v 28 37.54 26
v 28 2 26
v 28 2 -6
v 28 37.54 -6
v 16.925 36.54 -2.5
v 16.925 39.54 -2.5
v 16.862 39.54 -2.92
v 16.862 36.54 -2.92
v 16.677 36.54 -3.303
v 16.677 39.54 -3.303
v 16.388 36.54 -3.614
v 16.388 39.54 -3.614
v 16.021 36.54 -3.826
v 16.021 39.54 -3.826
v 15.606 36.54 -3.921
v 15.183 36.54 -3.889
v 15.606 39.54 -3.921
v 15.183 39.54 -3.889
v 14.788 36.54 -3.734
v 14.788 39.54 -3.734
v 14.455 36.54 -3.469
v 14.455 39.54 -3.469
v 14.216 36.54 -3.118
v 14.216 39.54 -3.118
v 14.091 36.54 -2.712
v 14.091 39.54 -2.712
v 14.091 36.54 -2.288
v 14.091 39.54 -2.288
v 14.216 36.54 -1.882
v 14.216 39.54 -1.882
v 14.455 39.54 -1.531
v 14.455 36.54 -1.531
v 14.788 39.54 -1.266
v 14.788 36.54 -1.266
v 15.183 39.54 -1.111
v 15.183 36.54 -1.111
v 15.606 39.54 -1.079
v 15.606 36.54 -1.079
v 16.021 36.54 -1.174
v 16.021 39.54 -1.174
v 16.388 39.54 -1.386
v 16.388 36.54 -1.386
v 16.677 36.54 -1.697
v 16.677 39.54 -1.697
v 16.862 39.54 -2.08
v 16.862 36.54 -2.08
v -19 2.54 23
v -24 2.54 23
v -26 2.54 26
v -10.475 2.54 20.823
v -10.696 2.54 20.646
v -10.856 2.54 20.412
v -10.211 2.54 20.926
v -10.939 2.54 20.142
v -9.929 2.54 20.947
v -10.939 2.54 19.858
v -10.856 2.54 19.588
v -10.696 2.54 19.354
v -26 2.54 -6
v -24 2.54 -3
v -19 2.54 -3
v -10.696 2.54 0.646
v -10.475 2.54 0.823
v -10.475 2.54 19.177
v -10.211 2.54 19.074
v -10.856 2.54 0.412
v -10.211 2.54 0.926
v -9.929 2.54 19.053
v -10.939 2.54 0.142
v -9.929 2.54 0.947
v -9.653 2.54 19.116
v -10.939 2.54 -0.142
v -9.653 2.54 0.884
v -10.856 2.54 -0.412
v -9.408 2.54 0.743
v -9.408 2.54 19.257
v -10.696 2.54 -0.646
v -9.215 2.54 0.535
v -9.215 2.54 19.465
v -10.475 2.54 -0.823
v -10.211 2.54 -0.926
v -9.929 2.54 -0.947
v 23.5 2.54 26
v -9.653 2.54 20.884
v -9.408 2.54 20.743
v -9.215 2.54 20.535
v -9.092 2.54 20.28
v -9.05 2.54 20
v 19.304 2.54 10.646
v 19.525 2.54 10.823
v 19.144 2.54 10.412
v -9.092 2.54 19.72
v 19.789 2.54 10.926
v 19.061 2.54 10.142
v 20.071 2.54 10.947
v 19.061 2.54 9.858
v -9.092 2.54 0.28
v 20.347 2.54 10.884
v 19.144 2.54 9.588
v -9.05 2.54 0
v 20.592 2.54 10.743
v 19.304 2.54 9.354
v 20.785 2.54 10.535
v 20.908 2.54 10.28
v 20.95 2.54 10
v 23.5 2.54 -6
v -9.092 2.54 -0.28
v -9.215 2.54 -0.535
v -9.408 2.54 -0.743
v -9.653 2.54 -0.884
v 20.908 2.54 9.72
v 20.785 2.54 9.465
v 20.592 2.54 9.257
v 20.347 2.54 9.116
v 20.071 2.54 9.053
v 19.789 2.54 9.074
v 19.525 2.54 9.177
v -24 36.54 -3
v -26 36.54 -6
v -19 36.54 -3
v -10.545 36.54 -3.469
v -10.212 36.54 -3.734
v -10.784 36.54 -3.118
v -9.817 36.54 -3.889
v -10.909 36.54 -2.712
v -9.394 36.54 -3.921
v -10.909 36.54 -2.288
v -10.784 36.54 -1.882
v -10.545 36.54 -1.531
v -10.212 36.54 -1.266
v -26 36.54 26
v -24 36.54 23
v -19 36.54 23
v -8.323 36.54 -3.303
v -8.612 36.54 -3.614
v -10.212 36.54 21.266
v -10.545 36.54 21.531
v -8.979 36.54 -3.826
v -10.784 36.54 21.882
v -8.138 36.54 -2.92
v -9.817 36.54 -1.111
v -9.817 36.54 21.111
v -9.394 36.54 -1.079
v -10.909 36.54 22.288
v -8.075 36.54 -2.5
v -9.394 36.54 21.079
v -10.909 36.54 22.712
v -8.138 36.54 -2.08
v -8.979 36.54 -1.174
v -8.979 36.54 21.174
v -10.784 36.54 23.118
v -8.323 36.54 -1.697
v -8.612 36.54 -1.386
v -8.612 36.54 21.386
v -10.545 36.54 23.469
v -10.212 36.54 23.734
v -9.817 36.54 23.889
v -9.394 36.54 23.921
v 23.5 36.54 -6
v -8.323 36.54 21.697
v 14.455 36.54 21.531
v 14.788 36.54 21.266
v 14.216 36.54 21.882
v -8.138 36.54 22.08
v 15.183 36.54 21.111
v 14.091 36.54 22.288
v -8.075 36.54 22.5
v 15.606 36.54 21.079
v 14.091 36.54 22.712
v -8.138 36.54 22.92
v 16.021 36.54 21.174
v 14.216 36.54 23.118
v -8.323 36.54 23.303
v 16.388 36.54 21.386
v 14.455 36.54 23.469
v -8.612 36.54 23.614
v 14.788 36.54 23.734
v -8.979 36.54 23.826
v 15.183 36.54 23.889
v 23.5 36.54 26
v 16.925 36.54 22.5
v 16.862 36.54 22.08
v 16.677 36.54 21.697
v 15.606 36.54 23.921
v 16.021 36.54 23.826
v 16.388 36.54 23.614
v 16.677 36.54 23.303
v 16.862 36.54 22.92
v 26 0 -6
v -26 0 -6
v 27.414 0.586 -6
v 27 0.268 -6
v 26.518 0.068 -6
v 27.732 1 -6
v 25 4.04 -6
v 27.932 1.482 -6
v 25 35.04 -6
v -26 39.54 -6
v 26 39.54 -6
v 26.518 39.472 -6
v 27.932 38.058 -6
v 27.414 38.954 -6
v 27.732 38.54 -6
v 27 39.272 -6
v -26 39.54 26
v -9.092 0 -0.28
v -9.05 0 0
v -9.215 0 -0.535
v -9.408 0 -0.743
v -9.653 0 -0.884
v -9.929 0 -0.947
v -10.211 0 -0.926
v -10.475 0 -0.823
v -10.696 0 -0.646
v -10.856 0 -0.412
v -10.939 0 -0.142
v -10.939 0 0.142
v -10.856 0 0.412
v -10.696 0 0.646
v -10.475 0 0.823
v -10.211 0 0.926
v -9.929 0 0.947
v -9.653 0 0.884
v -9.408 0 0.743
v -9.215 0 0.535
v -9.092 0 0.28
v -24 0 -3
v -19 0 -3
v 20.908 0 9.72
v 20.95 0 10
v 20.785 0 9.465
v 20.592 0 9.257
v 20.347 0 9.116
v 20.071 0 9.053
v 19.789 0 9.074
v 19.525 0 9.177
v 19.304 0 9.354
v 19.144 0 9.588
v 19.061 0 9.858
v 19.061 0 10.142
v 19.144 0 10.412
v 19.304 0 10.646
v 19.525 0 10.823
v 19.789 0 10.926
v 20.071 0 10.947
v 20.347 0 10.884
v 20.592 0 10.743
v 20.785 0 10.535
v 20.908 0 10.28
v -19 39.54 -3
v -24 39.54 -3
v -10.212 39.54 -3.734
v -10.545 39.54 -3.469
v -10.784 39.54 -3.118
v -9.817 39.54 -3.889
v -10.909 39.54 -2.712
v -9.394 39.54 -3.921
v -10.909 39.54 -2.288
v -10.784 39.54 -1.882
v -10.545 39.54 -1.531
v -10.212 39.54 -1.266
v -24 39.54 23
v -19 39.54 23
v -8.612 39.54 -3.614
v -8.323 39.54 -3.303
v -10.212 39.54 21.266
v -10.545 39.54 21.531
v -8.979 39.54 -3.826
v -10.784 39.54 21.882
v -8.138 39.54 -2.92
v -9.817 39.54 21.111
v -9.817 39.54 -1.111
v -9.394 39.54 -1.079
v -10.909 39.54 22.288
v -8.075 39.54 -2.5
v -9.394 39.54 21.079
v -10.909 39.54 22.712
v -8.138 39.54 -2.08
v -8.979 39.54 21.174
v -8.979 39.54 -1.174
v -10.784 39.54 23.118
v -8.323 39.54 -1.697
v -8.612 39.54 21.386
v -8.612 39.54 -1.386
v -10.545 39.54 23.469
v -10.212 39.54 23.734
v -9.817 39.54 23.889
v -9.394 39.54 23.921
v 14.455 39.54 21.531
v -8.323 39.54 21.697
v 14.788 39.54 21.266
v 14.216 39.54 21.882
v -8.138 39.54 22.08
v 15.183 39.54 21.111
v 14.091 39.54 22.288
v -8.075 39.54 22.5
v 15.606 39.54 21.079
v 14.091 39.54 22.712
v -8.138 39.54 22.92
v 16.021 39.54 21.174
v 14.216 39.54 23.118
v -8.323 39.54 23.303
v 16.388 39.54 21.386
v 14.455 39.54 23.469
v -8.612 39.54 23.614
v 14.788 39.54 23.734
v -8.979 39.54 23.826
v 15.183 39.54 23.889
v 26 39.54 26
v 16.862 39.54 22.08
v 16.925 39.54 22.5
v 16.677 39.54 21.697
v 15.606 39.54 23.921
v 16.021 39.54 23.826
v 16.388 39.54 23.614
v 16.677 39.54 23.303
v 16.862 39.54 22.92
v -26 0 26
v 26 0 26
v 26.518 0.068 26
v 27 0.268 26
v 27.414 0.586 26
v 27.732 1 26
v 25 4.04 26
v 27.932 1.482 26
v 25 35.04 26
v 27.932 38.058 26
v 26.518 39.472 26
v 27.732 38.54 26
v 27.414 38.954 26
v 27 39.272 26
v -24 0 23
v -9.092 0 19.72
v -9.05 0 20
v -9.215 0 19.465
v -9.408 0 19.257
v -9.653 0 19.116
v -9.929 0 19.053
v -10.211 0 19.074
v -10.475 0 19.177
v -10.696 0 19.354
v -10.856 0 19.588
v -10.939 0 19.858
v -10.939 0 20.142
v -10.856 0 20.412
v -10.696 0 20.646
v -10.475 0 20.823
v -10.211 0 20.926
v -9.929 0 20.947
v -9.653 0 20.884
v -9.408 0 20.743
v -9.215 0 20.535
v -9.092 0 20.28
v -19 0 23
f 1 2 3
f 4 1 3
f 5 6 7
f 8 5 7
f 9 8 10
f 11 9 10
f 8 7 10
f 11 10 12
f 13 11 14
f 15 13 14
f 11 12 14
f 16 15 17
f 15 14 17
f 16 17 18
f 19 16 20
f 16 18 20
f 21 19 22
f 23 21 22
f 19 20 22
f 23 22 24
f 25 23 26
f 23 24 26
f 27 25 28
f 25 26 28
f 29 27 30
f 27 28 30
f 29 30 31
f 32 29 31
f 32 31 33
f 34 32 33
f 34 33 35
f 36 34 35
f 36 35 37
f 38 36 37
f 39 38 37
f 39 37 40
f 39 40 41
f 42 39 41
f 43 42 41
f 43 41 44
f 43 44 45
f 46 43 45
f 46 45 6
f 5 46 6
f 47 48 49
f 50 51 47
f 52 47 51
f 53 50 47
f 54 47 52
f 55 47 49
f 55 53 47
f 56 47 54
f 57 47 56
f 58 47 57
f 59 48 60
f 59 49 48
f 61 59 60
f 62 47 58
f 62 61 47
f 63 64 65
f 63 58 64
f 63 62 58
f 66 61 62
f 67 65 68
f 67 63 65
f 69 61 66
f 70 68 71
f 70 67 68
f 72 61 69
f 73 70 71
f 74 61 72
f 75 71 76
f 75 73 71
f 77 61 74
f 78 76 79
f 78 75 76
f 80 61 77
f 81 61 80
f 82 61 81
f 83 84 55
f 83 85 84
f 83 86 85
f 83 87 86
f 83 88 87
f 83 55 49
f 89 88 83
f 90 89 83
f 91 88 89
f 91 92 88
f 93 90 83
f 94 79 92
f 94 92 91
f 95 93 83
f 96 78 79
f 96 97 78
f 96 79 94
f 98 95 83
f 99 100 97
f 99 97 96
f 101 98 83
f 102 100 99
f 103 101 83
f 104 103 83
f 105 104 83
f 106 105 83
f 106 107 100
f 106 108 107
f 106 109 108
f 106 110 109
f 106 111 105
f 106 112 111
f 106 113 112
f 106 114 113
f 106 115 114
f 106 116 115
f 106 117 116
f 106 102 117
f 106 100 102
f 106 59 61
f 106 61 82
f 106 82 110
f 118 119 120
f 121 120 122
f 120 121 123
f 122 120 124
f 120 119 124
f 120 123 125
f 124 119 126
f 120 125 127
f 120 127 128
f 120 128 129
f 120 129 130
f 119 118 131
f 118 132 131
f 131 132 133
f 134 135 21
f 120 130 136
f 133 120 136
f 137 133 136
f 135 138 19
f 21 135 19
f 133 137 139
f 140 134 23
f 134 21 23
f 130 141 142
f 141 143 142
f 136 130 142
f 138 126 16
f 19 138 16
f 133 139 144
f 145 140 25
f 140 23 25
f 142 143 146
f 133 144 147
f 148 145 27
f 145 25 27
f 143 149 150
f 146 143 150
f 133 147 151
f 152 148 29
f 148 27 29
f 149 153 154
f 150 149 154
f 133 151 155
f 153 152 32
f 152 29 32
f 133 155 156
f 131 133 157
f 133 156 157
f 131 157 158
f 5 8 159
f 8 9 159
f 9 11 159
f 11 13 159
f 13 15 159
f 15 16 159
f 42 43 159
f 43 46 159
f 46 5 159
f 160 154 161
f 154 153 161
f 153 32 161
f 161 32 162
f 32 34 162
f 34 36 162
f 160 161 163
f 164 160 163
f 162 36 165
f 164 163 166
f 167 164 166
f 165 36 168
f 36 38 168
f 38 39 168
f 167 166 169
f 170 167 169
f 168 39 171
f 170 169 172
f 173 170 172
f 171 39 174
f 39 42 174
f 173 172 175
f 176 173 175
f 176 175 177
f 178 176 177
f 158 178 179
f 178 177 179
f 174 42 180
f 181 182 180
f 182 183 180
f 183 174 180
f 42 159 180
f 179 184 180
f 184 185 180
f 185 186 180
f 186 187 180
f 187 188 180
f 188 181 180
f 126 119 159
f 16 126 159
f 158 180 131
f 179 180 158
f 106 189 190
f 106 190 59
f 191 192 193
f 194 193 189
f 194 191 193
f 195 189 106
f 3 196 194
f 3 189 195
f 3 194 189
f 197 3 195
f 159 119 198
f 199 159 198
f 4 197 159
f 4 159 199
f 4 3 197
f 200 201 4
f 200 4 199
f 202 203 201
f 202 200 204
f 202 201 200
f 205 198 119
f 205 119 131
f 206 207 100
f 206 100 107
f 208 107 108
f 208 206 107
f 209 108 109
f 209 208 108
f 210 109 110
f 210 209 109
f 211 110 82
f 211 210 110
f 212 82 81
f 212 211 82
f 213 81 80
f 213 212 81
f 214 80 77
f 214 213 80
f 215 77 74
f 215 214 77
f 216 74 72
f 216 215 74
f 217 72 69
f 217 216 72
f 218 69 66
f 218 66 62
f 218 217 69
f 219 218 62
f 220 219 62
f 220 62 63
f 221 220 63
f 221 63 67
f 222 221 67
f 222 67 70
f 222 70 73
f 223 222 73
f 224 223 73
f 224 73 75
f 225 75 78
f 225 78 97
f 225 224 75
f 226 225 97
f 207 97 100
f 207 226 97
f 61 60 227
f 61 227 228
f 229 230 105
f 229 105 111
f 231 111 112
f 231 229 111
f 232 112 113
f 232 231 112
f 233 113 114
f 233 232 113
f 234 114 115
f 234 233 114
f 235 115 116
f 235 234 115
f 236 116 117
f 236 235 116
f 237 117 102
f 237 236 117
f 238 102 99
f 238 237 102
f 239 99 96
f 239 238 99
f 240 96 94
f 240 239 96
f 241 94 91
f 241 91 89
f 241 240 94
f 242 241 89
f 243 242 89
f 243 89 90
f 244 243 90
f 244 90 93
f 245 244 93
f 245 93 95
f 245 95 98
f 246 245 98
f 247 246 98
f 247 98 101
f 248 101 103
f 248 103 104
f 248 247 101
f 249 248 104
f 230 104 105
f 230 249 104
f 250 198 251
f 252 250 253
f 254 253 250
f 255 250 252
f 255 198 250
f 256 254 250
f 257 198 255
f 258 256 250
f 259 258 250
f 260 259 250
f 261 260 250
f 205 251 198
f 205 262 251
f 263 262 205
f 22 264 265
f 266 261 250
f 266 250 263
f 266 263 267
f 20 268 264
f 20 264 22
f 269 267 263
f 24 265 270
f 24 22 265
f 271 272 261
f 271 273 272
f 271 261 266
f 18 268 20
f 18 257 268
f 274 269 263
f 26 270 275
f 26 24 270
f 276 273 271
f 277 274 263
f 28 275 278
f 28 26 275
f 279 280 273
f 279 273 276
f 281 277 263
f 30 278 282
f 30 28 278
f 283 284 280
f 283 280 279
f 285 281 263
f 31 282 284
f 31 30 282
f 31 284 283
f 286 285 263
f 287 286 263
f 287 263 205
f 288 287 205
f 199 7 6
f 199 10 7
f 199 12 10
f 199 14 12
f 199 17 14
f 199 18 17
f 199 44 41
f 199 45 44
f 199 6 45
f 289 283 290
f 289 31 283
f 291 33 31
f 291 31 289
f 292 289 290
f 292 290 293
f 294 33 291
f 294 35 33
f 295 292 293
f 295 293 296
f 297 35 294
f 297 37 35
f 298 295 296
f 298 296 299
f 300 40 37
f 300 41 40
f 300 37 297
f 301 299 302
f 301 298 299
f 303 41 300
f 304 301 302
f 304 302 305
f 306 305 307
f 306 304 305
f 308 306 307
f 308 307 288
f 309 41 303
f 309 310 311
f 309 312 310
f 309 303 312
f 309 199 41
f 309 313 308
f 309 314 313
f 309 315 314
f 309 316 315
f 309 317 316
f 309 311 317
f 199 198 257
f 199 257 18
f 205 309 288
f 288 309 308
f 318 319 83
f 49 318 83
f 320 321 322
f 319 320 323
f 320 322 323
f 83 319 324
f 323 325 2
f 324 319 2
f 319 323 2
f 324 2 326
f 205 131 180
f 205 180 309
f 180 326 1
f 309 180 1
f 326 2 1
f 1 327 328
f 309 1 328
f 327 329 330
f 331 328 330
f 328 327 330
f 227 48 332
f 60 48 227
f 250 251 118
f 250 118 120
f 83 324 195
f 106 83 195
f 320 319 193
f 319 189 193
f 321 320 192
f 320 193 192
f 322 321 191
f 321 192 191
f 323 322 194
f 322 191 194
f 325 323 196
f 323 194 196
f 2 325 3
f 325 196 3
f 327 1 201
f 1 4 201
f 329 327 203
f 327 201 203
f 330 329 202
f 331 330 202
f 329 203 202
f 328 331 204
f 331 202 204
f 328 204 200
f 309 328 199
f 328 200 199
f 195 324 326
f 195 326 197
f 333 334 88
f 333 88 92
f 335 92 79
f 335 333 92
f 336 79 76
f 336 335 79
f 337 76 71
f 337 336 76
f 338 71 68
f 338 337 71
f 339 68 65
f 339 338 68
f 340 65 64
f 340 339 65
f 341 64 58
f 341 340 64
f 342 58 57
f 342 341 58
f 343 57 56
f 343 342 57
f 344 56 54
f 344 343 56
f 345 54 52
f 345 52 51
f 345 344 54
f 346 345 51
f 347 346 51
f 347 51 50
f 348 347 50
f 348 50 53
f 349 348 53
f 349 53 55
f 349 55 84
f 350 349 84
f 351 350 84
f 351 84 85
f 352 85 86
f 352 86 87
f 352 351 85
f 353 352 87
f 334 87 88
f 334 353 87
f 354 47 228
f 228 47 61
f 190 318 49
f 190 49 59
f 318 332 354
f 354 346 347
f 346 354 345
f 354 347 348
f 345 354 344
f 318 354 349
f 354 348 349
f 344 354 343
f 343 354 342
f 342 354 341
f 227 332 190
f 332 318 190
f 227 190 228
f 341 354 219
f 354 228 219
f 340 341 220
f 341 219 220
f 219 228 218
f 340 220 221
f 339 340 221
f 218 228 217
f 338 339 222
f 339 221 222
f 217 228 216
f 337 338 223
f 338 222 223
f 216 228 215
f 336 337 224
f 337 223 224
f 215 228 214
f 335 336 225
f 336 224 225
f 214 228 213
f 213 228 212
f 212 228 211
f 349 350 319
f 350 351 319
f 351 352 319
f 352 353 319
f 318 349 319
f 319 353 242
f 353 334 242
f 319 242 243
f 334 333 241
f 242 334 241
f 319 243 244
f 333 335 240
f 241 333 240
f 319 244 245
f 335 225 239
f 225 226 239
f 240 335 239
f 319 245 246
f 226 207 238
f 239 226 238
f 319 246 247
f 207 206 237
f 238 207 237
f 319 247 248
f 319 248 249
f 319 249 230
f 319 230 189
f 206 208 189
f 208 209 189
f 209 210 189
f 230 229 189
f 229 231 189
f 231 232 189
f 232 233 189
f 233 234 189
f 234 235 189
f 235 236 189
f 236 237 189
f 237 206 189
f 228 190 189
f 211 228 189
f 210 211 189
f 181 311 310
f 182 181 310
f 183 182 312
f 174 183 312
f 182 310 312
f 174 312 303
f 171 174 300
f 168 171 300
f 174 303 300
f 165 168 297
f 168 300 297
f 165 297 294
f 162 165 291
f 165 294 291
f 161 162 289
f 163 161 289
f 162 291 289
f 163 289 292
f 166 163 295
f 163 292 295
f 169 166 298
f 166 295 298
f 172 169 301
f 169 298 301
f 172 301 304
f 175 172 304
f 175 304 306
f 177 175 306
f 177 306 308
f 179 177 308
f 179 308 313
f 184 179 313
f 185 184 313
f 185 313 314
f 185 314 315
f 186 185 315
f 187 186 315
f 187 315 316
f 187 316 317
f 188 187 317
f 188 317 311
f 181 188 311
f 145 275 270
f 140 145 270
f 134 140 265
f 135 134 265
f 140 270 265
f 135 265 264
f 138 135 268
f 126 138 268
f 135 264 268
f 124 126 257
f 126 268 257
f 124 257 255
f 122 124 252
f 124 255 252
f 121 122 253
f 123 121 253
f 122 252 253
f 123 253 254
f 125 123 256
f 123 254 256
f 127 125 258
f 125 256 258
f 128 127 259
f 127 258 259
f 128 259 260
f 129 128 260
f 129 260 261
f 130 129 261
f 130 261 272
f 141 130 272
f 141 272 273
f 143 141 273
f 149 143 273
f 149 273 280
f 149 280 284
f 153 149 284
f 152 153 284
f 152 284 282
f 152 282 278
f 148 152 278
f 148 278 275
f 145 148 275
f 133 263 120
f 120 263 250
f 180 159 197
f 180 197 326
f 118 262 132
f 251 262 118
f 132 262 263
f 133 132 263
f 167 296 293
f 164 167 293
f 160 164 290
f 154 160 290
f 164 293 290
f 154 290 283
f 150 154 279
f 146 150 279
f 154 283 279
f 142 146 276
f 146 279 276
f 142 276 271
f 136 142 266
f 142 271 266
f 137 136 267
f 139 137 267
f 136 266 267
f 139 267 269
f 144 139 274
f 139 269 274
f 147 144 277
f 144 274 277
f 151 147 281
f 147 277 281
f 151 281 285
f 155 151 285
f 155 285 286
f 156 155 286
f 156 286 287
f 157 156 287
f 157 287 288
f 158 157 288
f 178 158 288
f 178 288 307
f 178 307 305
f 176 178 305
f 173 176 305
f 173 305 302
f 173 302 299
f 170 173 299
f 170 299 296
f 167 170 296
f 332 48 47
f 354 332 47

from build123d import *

# Parameters (mm, degrees)
SKETCH1_W               = 54
SKETCH1_H               = 32
SKETCH1_R               = 0.95
BOSS_EXTRUDE1_DEPTH     = 2.54
SKETCH3_W               = 3
SKETCH3_H               = 32
BOSS_EXTRUDE2_DEPTH     = 37
SKETCH4_W               = 32
SKETCH4_H               = 3
BOSS_EXTRUDE3_DEPTH     = 47
FILLET1_R               = 2
SKETCH5_R               = 1.425
CUT_EXTRUDE1_DEPTH      = 20
SKETCH8_W               = 32
SKETCH8_H               = 3
BOSS_EXTRUDE4_DEPTH     = 4
SKETCH7_W               = 5
SKETCH7_H               = 26
CUT_EXTRUDE3_DEPTH      = 1
CUT_EXTRUDE3_DEPTH_BACK = 40.54
CHAMFER1_SIZE           = 1.5


with BuildPart() as part:
    # Sketch1 → Boss-Extrude1 (new body)
    with BuildSketch(Plane(origin=(0, 0, 0), x_dir=(1, 0, 0), z_dir=(0, 1, 0))):
        with Locations((1, -10)):
            Rectangle(SKETCH1_W, SKETCH1_H)
        with Locations((-10, 0)):
            Circle(SKETCH1_R, mode=Mode.SUBTRACT)
        with Locations((20, -10)):
            Circle(SKETCH1_R, mode=Mode.SUBTRACT)
        with Locations((-10, -20)):
            Circle(SKETCH1_R, mode=Mode.SUBTRACT)
    extrude(amount=BOSS_EXTRUDE1_DEPTH)

    # Sketch3 → Boss-Extrude2 (add)
    with BuildSketch(Plane(origin=(0, 2.54, 0), x_dir=(1, 0, 0), z_dir=(0, 1, 0))):
        with Locations((26.5, -10)):
            Rectangle(SKETCH3_W, SKETCH3_H)
    extrude(amount=BOSS_EXTRUDE2_DEPTH)

    # Sketch4 → Boss-Extrude3 (add)
    with BuildSketch(Plane.ZY.offset(-25)):
        with Locations((10, 38.04)):
            Rectangle(SKETCH4_W, SKETCH4_H)
    extrude(amount=BOSS_EXTRUDE3_DEPTH)

    # Fillet1
    fillet1_edges = [part.edges().sort_by_distance(p)[0] for p in [
        (28, 0, 10),
        (28, 39.54, 10),
    ]]
    fillet(fillet1_edges, radius=FILLET1_R)

    # Sketch5 → Cut-Extrude1 (cut)
    with BuildSketch(Plane(origin=(0, 39.54, 0), x_dir=(1, 0, 0), z_dir=(0, 1, 0))):
        with Locations((-9.5, 2.5)):
            Circle(SKETCH5_R)
        with Locations((15.5, 2.5)):
            Circle(SKETCH5_R)
        with Locations((15.5, -22.5)):
            Circle(SKETCH5_R)
        with Locations((-9.5, -22.5)):
            Circle(SKETCH5_R)
    extrude(amount=-CUT_EXTRUDE1_DEPTH, mode=Mode.SUBTRACT)

    # Sketch8 → Boss-Extrude4 (add)
    with BuildSketch(Plane.ZY.offset(22)):
        with Locations((10, 38.04)):
            Rectangle(SKETCH8_W, SKETCH8_H)
    extrude(amount=BOSS_EXTRUDE4_DEPTH)

    # Sketch7 → Cut-Extrude3 (cut, two sides)
    with BuildSketch(Plane(origin=(0, 39.54, 0), x_dir=(1, 0, 0), z_dir=(0, 1, 0))) as cut_extrude3_sk:
        with Locations((-21.5, -10)):
            Rectangle(SKETCH7_W, SKETCH7_H)
    extrude(amount=CUT_EXTRUDE3_DEPTH, mode=Mode.SUBTRACT)
    extrude(cut_extrude3_sk.sketch, amount=-CUT_EXTRUDE3_DEPTH_BACK, mode=Mode.SUBTRACT)

    # Chamfer1
    chamfer1_edges = [part.edges().sort_by_distance(p)[0] for p in [
        (25, 2.54, 10),
        (25, 36.54, 10),
    ]]
    chamfer(chamfer1_edges, length=CHAMFER1_SIZE)


solid = part.part
